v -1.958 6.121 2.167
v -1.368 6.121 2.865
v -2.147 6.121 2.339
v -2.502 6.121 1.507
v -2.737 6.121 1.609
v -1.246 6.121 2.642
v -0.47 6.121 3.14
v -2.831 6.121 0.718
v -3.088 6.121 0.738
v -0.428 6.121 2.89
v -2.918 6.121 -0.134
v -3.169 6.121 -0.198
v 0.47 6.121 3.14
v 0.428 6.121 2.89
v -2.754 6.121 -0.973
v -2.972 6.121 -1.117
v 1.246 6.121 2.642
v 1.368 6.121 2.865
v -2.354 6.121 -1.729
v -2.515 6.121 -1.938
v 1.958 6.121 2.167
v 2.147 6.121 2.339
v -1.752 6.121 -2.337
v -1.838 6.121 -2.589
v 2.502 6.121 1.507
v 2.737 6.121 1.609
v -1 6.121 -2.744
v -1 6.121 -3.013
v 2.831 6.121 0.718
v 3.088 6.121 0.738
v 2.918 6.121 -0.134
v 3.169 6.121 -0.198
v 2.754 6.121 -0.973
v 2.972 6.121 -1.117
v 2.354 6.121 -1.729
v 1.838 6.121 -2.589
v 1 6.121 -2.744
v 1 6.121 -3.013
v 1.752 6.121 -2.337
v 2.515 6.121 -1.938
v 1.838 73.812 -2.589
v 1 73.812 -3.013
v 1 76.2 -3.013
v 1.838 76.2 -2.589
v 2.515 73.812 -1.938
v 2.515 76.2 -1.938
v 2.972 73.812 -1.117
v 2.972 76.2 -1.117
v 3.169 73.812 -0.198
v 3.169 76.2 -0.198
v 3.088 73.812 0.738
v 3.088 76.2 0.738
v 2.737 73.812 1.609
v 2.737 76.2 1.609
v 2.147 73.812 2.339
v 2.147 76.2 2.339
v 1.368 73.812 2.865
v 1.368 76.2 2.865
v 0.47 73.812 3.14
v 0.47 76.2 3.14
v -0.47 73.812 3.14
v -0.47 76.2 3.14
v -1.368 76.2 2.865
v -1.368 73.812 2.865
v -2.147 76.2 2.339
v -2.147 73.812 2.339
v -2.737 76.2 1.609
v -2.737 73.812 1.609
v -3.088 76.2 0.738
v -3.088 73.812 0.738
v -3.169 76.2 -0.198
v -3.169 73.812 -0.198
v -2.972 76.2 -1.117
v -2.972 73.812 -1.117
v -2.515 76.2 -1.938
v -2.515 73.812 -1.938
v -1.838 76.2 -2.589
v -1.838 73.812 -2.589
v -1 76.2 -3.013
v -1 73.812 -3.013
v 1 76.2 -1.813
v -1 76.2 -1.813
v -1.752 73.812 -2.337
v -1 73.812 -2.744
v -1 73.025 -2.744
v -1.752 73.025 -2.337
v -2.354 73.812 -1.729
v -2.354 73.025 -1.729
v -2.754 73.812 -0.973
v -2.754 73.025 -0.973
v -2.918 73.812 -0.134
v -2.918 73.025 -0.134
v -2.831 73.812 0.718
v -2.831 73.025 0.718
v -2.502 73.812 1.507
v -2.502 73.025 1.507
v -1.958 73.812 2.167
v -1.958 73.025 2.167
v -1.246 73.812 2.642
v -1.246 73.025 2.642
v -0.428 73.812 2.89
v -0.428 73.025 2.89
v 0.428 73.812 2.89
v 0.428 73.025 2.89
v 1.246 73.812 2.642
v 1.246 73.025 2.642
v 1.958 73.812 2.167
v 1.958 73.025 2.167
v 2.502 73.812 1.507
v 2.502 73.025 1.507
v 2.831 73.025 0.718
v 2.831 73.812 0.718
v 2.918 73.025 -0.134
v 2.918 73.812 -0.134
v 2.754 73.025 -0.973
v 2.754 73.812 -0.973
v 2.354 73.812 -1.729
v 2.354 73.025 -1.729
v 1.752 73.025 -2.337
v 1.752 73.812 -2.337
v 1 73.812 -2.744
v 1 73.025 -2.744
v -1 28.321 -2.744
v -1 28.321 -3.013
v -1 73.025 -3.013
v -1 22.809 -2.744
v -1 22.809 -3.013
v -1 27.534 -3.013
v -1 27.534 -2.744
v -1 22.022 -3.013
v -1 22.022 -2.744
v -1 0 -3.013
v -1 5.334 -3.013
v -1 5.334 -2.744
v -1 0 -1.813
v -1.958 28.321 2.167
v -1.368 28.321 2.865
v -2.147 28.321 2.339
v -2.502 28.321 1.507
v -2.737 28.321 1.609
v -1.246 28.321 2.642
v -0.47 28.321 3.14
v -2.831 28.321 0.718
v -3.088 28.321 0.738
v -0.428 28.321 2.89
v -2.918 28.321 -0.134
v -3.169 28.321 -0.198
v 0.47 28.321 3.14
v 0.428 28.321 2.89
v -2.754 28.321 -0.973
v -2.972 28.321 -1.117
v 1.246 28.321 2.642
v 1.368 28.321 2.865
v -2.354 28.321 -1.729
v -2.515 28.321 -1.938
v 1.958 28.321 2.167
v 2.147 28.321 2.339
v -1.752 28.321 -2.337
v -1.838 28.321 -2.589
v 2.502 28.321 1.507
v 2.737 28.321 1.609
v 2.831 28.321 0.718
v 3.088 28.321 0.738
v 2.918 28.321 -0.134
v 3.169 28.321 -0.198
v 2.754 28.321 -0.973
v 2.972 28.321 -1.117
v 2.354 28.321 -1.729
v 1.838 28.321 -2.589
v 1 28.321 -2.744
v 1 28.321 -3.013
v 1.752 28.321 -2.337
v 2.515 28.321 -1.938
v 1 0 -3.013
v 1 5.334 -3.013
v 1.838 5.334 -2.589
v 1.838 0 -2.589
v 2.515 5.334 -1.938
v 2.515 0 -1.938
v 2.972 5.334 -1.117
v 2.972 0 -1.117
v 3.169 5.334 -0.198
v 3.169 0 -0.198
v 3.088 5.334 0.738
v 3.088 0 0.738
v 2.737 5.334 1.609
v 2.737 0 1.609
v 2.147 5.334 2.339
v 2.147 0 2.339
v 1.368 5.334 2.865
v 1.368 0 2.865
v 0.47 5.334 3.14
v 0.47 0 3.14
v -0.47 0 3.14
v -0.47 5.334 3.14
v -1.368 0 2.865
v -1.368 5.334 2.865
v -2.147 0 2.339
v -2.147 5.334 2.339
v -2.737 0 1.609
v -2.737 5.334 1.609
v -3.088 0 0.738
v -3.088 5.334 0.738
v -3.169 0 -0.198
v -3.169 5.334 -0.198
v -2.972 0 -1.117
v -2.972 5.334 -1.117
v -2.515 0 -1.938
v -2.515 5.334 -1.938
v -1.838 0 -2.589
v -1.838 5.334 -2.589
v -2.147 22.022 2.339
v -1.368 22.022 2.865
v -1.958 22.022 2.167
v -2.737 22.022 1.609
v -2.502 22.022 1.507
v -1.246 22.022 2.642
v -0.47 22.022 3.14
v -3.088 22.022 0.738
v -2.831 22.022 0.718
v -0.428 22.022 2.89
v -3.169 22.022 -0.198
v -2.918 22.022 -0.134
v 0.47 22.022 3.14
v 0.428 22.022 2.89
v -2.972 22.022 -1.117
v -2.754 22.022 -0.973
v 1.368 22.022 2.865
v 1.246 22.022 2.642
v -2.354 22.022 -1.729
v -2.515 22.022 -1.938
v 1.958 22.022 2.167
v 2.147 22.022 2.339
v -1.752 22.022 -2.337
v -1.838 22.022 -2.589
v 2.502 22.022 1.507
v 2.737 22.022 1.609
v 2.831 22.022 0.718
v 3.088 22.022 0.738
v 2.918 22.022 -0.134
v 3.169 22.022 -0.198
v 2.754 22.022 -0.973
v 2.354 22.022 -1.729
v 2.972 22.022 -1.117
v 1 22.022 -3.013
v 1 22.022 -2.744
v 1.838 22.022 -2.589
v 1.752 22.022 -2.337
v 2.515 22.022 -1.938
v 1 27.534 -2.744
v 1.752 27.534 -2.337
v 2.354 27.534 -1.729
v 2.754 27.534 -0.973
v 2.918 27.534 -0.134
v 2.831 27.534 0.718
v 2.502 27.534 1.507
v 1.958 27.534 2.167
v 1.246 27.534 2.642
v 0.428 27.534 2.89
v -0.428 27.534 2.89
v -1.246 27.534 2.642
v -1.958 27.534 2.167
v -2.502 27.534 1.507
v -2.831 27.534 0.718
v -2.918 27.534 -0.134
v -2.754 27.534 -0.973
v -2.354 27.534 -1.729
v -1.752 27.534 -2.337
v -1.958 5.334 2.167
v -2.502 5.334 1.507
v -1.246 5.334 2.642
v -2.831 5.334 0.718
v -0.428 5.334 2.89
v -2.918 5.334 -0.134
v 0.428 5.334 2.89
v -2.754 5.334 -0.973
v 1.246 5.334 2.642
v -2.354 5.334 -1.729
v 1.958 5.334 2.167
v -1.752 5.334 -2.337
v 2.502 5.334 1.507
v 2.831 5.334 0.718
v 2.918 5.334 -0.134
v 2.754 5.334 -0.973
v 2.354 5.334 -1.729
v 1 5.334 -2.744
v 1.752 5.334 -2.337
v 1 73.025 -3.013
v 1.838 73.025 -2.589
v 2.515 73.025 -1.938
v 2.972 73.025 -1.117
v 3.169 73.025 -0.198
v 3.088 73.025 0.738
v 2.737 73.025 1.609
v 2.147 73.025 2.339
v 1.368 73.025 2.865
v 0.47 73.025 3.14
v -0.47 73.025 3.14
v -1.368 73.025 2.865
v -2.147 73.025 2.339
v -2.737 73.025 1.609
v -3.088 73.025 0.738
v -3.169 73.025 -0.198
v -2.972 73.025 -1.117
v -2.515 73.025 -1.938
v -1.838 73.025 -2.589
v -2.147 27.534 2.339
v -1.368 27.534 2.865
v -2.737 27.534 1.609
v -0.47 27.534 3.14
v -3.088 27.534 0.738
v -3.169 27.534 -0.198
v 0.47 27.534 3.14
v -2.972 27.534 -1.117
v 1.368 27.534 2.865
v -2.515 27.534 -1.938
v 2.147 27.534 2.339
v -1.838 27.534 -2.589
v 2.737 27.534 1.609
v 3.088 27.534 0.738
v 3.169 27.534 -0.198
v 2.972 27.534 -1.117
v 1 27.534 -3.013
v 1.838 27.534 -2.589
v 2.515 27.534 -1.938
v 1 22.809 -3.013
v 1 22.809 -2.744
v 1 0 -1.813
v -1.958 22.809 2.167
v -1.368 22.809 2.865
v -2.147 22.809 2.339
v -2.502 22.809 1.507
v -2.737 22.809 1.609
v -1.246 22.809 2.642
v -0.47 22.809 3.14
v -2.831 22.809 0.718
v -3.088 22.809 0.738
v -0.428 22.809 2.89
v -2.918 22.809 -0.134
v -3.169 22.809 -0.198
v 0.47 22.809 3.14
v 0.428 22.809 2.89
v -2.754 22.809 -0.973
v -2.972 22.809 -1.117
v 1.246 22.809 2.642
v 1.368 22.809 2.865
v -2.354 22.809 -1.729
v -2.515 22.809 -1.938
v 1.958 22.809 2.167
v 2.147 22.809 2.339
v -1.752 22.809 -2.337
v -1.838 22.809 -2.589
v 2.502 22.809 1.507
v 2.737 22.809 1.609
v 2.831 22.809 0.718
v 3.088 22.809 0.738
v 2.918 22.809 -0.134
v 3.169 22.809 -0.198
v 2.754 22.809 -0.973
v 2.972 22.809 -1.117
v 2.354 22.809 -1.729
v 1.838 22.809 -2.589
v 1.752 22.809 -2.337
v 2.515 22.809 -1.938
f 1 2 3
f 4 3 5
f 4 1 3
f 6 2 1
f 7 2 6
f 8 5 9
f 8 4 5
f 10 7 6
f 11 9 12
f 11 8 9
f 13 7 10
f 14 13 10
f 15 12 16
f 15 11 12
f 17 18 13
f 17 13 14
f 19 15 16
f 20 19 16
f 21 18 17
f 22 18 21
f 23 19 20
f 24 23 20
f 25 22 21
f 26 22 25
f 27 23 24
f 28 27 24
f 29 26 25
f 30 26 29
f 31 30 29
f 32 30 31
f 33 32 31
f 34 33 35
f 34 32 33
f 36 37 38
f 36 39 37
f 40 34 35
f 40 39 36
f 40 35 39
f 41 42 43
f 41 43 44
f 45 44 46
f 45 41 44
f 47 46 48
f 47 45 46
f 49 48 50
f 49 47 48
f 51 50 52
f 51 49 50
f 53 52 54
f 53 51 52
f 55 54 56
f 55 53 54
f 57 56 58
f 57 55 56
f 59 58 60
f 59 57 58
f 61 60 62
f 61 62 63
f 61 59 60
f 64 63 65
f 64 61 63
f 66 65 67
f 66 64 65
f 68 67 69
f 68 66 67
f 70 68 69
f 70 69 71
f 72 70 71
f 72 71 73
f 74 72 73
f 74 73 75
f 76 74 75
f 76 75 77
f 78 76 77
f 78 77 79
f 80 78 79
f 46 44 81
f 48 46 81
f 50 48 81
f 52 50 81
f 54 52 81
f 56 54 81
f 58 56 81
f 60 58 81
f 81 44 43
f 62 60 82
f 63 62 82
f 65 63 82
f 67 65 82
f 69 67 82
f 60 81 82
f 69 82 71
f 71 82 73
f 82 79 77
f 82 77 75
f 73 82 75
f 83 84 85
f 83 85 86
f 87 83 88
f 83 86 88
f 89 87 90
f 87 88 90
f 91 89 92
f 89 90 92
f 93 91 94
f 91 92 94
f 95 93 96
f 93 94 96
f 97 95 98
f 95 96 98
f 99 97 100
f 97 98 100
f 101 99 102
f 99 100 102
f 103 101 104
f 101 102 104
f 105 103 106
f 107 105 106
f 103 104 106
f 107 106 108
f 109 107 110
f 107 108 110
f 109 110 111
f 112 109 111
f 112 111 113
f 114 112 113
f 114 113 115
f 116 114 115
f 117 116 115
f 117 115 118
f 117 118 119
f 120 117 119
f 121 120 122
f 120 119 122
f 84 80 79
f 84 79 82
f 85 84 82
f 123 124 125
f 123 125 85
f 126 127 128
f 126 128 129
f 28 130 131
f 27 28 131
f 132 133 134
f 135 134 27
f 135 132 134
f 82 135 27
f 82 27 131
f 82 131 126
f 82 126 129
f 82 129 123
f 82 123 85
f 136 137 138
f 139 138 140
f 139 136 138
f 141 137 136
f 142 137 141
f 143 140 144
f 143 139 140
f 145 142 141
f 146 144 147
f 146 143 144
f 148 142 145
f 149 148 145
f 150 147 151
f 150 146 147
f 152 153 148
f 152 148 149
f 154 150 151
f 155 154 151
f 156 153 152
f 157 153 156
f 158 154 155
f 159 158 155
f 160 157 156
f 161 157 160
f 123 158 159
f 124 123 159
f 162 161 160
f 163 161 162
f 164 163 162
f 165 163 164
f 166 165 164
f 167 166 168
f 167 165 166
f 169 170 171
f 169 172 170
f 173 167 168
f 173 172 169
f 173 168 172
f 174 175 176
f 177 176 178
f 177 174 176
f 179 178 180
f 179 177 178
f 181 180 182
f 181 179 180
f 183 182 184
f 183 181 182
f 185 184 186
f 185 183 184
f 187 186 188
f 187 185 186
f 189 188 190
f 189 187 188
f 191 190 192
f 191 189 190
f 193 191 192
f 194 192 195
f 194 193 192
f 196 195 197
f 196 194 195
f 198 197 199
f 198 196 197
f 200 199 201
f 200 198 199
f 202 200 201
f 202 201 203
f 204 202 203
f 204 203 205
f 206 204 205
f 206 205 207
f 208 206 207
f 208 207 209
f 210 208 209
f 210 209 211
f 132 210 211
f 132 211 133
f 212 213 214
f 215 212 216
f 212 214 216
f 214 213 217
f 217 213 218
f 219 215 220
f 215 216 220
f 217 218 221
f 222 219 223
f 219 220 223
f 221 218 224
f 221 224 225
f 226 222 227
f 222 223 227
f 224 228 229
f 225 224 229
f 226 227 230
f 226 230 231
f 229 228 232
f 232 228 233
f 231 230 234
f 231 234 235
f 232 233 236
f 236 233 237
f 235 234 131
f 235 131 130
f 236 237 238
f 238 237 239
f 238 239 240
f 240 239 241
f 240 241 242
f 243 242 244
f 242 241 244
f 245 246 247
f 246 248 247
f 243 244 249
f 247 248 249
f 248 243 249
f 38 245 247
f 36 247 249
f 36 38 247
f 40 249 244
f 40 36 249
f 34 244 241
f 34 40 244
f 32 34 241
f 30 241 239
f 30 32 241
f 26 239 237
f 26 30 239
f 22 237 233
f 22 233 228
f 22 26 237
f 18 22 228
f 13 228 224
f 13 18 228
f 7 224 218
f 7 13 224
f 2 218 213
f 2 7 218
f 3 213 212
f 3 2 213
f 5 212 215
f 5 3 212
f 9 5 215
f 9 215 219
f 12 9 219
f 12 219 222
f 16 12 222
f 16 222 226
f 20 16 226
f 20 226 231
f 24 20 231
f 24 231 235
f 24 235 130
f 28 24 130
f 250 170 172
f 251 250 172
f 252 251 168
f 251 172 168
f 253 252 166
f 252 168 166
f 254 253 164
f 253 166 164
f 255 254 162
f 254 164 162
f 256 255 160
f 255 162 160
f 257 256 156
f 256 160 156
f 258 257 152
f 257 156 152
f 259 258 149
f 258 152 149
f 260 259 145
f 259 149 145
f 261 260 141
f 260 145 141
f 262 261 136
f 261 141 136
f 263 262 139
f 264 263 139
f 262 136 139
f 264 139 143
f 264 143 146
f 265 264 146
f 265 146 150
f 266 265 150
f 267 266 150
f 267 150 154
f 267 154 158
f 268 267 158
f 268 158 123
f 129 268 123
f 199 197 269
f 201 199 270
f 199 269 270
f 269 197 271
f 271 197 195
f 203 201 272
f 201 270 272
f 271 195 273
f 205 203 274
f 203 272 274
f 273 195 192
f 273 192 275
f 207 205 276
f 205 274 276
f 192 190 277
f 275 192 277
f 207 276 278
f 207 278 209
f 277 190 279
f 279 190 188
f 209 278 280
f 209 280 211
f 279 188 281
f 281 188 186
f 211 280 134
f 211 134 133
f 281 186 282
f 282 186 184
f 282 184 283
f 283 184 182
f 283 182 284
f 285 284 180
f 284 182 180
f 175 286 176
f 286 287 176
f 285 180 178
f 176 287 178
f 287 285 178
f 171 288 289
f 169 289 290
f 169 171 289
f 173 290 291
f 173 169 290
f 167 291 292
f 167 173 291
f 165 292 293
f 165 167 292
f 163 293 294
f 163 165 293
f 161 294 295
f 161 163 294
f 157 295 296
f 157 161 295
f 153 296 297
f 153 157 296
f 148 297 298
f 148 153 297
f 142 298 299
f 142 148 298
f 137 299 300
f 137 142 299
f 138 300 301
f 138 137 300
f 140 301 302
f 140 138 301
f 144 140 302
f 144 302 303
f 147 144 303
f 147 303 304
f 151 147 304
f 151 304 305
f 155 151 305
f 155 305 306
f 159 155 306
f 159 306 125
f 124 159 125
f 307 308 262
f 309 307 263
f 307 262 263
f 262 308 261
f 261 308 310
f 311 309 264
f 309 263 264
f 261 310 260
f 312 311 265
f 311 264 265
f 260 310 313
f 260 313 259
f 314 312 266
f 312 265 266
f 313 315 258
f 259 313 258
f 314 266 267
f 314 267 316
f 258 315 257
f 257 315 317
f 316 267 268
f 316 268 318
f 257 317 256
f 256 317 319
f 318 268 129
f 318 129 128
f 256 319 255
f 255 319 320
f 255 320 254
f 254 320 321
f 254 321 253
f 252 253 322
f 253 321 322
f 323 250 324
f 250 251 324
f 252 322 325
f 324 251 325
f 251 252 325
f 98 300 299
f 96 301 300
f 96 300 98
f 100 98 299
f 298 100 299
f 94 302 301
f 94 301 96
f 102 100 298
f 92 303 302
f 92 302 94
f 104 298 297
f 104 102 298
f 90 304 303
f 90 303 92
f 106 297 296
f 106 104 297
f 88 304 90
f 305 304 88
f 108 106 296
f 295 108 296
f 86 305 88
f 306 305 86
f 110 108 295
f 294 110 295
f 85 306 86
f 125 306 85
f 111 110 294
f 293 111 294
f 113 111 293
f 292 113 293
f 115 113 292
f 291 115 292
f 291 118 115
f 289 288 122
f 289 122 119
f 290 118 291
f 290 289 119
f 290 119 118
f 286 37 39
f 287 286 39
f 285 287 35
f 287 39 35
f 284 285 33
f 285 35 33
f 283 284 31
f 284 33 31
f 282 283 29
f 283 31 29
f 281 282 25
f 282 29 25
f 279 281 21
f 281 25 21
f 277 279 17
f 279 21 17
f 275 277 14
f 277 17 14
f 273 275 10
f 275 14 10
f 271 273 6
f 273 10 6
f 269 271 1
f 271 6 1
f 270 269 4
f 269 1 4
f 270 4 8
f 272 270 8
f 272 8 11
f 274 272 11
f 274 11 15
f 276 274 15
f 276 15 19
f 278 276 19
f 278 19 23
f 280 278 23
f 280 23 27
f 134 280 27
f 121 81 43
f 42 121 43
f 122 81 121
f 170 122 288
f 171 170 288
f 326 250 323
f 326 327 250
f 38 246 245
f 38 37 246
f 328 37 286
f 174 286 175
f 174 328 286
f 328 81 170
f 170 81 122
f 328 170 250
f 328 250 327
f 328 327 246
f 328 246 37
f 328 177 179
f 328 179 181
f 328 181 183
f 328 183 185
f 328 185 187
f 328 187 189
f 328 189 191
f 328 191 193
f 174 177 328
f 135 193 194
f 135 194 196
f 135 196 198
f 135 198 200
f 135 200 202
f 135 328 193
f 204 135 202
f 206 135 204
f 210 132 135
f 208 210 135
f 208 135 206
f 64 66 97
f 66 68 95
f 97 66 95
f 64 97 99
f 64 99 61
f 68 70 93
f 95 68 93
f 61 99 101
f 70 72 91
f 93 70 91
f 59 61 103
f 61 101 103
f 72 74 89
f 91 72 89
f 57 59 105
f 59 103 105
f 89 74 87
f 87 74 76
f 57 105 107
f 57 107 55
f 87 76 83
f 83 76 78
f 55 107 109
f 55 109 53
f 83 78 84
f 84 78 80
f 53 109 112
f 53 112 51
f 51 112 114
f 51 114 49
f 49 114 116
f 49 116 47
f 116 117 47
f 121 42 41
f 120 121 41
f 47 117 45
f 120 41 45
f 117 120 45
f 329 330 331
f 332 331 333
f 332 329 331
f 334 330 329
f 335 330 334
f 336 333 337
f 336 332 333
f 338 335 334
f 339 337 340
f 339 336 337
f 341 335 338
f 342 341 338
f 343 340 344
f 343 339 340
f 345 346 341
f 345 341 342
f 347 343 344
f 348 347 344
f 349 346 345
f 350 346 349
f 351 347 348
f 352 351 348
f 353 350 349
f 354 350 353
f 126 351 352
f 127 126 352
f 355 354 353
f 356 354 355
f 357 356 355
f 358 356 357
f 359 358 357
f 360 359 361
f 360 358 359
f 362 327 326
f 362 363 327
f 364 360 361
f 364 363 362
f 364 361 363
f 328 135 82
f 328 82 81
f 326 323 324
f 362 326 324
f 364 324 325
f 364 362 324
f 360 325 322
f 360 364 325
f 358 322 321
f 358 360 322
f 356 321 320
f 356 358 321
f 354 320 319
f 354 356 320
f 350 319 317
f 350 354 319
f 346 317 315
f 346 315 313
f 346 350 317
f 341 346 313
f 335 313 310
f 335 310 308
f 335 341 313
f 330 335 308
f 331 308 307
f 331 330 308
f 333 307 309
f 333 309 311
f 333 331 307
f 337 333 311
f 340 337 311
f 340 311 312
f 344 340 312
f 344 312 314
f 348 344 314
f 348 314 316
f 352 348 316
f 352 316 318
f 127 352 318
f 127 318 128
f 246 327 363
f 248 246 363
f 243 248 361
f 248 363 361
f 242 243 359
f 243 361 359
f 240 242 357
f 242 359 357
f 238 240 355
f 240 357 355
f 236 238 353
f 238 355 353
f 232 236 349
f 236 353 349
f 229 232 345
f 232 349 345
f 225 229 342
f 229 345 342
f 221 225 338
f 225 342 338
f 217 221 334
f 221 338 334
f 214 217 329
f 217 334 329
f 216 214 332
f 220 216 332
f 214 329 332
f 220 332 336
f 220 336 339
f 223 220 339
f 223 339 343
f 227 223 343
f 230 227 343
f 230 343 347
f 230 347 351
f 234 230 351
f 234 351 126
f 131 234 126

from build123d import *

# Parameters (mm, degrees)
BOSS_EXTRUDE1_DEPTH = 76.2
CUT_EXTRUDE1_START  = -3.175
SKETCH2_R           = 3.175
SKETCH2_R_2         = 2.921
CUT_EXTRUDE1_DEPTH  = 0.7874
CUT_EXTRUDE2_START  = -28.321
SKETCH3_R           = 3.175
SKETCH3_R_2         = 2.921
CUT_EXTRUDE2_DEPTH  = 0.7874
CUT_EXTRUDE3_START  = -22.8092
SKETCH3_6_R         = 3.175
SKETCH3_6_R_2       = 2.921
CUT_EXTRUDE3_DEPTH  = 0.7874
CUT_EXTRUDE4_START  = -6.1214
SKETCH3_7_R         = 3.175
SKETCH3_7_R_2       = 2.921
CUT_EXTRUDE4_DEPTH  = 0.7874


with BuildPart() as part:
    # Sketch1 → Boss-Extrude1 (new body)
    with BuildSketch(Plane(origin=(0, 0, 0), x_dir=(1, 0, 0), z_dir=(0, 1, 0))):
        with BuildLine():
            Line((-1, 3.01340754), (-1, 1.81340754))
            Line((-1, 1.81340754), (1, 1.81340754))
            Line((1, 1.81340754), (1, 3.01340754))
            ThreePointArc((1, 3.01340754), (0, -3.175), (-1, 3.01340754))
        make_face()
    extrude(amount=BOSS_EXTRUDE1_DEPTH)

    # Sketch2 → Cut-Extrude1 (cut)
    with BuildSketch(Plane(origin=(0, 76.2, 0), x_dir=(1, 0, 0), z_dir=(0, 1, 0)).offset(CUT_EXTRUDE1_START)):
        Circle(SKETCH2_R)
        Circle(SKETCH2_R_2, mode=Mode.SUBTRACT)
    extrude(amount=CUT_EXTRUDE1_DEPTH, mode=Mode.SUBTRACT)

    # Sketch3 → Cut-Extrude2 (cut)
    with BuildSketch(Plane(origin=(0, 0, 0), x_dir=(0, 0, -1), z_dir=(0, -1, 0)).offset(CUT_EXTRUDE2_START)):
        Circle(SKETCH3_R)
        Circle(SKETCH3_R_2, mode=Mode.SUBTRACT)
    extrude(amount=CUT_EXTRUDE2_DEPTH, mode=Mode.SUBTRACT)

    # Sketch3<6> → Cut-Extrude3 (cut)
    with BuildSketch(Plane(origin=(0, 0, 0), x_dir=(0, 0, -1), z_dir=(0, -1, 0)).offset(CUT_EXTRUDE3_START)):
        Circle(SKETCH3_6_R)
        Circle(SKETCH3_6_R_2, mode=Mode.SUBTRACT)
    extrude(amount=CUT_EXTRUDE3_DEPTH, mode=Mode.SUBTRACT)

    # Sketch3<7> → Cut-Extrude4 (cut)
    with BuildSketch(Plane(origin=(0, 0, 0), x_dir=(0, 0, -1), z_dir=(0, -1, 0)).offset(CUT_EXTRUDE4_START)):
        Circle(SKETCH3_7_R)
        Circle(SKETCH3_7_R_2, mode=Mode.SUBTRACT)
    extrude(amount=CUT_EXTRUDE4_DEPTH, mode=Mode.SUBTRACT)


solid = part.part
